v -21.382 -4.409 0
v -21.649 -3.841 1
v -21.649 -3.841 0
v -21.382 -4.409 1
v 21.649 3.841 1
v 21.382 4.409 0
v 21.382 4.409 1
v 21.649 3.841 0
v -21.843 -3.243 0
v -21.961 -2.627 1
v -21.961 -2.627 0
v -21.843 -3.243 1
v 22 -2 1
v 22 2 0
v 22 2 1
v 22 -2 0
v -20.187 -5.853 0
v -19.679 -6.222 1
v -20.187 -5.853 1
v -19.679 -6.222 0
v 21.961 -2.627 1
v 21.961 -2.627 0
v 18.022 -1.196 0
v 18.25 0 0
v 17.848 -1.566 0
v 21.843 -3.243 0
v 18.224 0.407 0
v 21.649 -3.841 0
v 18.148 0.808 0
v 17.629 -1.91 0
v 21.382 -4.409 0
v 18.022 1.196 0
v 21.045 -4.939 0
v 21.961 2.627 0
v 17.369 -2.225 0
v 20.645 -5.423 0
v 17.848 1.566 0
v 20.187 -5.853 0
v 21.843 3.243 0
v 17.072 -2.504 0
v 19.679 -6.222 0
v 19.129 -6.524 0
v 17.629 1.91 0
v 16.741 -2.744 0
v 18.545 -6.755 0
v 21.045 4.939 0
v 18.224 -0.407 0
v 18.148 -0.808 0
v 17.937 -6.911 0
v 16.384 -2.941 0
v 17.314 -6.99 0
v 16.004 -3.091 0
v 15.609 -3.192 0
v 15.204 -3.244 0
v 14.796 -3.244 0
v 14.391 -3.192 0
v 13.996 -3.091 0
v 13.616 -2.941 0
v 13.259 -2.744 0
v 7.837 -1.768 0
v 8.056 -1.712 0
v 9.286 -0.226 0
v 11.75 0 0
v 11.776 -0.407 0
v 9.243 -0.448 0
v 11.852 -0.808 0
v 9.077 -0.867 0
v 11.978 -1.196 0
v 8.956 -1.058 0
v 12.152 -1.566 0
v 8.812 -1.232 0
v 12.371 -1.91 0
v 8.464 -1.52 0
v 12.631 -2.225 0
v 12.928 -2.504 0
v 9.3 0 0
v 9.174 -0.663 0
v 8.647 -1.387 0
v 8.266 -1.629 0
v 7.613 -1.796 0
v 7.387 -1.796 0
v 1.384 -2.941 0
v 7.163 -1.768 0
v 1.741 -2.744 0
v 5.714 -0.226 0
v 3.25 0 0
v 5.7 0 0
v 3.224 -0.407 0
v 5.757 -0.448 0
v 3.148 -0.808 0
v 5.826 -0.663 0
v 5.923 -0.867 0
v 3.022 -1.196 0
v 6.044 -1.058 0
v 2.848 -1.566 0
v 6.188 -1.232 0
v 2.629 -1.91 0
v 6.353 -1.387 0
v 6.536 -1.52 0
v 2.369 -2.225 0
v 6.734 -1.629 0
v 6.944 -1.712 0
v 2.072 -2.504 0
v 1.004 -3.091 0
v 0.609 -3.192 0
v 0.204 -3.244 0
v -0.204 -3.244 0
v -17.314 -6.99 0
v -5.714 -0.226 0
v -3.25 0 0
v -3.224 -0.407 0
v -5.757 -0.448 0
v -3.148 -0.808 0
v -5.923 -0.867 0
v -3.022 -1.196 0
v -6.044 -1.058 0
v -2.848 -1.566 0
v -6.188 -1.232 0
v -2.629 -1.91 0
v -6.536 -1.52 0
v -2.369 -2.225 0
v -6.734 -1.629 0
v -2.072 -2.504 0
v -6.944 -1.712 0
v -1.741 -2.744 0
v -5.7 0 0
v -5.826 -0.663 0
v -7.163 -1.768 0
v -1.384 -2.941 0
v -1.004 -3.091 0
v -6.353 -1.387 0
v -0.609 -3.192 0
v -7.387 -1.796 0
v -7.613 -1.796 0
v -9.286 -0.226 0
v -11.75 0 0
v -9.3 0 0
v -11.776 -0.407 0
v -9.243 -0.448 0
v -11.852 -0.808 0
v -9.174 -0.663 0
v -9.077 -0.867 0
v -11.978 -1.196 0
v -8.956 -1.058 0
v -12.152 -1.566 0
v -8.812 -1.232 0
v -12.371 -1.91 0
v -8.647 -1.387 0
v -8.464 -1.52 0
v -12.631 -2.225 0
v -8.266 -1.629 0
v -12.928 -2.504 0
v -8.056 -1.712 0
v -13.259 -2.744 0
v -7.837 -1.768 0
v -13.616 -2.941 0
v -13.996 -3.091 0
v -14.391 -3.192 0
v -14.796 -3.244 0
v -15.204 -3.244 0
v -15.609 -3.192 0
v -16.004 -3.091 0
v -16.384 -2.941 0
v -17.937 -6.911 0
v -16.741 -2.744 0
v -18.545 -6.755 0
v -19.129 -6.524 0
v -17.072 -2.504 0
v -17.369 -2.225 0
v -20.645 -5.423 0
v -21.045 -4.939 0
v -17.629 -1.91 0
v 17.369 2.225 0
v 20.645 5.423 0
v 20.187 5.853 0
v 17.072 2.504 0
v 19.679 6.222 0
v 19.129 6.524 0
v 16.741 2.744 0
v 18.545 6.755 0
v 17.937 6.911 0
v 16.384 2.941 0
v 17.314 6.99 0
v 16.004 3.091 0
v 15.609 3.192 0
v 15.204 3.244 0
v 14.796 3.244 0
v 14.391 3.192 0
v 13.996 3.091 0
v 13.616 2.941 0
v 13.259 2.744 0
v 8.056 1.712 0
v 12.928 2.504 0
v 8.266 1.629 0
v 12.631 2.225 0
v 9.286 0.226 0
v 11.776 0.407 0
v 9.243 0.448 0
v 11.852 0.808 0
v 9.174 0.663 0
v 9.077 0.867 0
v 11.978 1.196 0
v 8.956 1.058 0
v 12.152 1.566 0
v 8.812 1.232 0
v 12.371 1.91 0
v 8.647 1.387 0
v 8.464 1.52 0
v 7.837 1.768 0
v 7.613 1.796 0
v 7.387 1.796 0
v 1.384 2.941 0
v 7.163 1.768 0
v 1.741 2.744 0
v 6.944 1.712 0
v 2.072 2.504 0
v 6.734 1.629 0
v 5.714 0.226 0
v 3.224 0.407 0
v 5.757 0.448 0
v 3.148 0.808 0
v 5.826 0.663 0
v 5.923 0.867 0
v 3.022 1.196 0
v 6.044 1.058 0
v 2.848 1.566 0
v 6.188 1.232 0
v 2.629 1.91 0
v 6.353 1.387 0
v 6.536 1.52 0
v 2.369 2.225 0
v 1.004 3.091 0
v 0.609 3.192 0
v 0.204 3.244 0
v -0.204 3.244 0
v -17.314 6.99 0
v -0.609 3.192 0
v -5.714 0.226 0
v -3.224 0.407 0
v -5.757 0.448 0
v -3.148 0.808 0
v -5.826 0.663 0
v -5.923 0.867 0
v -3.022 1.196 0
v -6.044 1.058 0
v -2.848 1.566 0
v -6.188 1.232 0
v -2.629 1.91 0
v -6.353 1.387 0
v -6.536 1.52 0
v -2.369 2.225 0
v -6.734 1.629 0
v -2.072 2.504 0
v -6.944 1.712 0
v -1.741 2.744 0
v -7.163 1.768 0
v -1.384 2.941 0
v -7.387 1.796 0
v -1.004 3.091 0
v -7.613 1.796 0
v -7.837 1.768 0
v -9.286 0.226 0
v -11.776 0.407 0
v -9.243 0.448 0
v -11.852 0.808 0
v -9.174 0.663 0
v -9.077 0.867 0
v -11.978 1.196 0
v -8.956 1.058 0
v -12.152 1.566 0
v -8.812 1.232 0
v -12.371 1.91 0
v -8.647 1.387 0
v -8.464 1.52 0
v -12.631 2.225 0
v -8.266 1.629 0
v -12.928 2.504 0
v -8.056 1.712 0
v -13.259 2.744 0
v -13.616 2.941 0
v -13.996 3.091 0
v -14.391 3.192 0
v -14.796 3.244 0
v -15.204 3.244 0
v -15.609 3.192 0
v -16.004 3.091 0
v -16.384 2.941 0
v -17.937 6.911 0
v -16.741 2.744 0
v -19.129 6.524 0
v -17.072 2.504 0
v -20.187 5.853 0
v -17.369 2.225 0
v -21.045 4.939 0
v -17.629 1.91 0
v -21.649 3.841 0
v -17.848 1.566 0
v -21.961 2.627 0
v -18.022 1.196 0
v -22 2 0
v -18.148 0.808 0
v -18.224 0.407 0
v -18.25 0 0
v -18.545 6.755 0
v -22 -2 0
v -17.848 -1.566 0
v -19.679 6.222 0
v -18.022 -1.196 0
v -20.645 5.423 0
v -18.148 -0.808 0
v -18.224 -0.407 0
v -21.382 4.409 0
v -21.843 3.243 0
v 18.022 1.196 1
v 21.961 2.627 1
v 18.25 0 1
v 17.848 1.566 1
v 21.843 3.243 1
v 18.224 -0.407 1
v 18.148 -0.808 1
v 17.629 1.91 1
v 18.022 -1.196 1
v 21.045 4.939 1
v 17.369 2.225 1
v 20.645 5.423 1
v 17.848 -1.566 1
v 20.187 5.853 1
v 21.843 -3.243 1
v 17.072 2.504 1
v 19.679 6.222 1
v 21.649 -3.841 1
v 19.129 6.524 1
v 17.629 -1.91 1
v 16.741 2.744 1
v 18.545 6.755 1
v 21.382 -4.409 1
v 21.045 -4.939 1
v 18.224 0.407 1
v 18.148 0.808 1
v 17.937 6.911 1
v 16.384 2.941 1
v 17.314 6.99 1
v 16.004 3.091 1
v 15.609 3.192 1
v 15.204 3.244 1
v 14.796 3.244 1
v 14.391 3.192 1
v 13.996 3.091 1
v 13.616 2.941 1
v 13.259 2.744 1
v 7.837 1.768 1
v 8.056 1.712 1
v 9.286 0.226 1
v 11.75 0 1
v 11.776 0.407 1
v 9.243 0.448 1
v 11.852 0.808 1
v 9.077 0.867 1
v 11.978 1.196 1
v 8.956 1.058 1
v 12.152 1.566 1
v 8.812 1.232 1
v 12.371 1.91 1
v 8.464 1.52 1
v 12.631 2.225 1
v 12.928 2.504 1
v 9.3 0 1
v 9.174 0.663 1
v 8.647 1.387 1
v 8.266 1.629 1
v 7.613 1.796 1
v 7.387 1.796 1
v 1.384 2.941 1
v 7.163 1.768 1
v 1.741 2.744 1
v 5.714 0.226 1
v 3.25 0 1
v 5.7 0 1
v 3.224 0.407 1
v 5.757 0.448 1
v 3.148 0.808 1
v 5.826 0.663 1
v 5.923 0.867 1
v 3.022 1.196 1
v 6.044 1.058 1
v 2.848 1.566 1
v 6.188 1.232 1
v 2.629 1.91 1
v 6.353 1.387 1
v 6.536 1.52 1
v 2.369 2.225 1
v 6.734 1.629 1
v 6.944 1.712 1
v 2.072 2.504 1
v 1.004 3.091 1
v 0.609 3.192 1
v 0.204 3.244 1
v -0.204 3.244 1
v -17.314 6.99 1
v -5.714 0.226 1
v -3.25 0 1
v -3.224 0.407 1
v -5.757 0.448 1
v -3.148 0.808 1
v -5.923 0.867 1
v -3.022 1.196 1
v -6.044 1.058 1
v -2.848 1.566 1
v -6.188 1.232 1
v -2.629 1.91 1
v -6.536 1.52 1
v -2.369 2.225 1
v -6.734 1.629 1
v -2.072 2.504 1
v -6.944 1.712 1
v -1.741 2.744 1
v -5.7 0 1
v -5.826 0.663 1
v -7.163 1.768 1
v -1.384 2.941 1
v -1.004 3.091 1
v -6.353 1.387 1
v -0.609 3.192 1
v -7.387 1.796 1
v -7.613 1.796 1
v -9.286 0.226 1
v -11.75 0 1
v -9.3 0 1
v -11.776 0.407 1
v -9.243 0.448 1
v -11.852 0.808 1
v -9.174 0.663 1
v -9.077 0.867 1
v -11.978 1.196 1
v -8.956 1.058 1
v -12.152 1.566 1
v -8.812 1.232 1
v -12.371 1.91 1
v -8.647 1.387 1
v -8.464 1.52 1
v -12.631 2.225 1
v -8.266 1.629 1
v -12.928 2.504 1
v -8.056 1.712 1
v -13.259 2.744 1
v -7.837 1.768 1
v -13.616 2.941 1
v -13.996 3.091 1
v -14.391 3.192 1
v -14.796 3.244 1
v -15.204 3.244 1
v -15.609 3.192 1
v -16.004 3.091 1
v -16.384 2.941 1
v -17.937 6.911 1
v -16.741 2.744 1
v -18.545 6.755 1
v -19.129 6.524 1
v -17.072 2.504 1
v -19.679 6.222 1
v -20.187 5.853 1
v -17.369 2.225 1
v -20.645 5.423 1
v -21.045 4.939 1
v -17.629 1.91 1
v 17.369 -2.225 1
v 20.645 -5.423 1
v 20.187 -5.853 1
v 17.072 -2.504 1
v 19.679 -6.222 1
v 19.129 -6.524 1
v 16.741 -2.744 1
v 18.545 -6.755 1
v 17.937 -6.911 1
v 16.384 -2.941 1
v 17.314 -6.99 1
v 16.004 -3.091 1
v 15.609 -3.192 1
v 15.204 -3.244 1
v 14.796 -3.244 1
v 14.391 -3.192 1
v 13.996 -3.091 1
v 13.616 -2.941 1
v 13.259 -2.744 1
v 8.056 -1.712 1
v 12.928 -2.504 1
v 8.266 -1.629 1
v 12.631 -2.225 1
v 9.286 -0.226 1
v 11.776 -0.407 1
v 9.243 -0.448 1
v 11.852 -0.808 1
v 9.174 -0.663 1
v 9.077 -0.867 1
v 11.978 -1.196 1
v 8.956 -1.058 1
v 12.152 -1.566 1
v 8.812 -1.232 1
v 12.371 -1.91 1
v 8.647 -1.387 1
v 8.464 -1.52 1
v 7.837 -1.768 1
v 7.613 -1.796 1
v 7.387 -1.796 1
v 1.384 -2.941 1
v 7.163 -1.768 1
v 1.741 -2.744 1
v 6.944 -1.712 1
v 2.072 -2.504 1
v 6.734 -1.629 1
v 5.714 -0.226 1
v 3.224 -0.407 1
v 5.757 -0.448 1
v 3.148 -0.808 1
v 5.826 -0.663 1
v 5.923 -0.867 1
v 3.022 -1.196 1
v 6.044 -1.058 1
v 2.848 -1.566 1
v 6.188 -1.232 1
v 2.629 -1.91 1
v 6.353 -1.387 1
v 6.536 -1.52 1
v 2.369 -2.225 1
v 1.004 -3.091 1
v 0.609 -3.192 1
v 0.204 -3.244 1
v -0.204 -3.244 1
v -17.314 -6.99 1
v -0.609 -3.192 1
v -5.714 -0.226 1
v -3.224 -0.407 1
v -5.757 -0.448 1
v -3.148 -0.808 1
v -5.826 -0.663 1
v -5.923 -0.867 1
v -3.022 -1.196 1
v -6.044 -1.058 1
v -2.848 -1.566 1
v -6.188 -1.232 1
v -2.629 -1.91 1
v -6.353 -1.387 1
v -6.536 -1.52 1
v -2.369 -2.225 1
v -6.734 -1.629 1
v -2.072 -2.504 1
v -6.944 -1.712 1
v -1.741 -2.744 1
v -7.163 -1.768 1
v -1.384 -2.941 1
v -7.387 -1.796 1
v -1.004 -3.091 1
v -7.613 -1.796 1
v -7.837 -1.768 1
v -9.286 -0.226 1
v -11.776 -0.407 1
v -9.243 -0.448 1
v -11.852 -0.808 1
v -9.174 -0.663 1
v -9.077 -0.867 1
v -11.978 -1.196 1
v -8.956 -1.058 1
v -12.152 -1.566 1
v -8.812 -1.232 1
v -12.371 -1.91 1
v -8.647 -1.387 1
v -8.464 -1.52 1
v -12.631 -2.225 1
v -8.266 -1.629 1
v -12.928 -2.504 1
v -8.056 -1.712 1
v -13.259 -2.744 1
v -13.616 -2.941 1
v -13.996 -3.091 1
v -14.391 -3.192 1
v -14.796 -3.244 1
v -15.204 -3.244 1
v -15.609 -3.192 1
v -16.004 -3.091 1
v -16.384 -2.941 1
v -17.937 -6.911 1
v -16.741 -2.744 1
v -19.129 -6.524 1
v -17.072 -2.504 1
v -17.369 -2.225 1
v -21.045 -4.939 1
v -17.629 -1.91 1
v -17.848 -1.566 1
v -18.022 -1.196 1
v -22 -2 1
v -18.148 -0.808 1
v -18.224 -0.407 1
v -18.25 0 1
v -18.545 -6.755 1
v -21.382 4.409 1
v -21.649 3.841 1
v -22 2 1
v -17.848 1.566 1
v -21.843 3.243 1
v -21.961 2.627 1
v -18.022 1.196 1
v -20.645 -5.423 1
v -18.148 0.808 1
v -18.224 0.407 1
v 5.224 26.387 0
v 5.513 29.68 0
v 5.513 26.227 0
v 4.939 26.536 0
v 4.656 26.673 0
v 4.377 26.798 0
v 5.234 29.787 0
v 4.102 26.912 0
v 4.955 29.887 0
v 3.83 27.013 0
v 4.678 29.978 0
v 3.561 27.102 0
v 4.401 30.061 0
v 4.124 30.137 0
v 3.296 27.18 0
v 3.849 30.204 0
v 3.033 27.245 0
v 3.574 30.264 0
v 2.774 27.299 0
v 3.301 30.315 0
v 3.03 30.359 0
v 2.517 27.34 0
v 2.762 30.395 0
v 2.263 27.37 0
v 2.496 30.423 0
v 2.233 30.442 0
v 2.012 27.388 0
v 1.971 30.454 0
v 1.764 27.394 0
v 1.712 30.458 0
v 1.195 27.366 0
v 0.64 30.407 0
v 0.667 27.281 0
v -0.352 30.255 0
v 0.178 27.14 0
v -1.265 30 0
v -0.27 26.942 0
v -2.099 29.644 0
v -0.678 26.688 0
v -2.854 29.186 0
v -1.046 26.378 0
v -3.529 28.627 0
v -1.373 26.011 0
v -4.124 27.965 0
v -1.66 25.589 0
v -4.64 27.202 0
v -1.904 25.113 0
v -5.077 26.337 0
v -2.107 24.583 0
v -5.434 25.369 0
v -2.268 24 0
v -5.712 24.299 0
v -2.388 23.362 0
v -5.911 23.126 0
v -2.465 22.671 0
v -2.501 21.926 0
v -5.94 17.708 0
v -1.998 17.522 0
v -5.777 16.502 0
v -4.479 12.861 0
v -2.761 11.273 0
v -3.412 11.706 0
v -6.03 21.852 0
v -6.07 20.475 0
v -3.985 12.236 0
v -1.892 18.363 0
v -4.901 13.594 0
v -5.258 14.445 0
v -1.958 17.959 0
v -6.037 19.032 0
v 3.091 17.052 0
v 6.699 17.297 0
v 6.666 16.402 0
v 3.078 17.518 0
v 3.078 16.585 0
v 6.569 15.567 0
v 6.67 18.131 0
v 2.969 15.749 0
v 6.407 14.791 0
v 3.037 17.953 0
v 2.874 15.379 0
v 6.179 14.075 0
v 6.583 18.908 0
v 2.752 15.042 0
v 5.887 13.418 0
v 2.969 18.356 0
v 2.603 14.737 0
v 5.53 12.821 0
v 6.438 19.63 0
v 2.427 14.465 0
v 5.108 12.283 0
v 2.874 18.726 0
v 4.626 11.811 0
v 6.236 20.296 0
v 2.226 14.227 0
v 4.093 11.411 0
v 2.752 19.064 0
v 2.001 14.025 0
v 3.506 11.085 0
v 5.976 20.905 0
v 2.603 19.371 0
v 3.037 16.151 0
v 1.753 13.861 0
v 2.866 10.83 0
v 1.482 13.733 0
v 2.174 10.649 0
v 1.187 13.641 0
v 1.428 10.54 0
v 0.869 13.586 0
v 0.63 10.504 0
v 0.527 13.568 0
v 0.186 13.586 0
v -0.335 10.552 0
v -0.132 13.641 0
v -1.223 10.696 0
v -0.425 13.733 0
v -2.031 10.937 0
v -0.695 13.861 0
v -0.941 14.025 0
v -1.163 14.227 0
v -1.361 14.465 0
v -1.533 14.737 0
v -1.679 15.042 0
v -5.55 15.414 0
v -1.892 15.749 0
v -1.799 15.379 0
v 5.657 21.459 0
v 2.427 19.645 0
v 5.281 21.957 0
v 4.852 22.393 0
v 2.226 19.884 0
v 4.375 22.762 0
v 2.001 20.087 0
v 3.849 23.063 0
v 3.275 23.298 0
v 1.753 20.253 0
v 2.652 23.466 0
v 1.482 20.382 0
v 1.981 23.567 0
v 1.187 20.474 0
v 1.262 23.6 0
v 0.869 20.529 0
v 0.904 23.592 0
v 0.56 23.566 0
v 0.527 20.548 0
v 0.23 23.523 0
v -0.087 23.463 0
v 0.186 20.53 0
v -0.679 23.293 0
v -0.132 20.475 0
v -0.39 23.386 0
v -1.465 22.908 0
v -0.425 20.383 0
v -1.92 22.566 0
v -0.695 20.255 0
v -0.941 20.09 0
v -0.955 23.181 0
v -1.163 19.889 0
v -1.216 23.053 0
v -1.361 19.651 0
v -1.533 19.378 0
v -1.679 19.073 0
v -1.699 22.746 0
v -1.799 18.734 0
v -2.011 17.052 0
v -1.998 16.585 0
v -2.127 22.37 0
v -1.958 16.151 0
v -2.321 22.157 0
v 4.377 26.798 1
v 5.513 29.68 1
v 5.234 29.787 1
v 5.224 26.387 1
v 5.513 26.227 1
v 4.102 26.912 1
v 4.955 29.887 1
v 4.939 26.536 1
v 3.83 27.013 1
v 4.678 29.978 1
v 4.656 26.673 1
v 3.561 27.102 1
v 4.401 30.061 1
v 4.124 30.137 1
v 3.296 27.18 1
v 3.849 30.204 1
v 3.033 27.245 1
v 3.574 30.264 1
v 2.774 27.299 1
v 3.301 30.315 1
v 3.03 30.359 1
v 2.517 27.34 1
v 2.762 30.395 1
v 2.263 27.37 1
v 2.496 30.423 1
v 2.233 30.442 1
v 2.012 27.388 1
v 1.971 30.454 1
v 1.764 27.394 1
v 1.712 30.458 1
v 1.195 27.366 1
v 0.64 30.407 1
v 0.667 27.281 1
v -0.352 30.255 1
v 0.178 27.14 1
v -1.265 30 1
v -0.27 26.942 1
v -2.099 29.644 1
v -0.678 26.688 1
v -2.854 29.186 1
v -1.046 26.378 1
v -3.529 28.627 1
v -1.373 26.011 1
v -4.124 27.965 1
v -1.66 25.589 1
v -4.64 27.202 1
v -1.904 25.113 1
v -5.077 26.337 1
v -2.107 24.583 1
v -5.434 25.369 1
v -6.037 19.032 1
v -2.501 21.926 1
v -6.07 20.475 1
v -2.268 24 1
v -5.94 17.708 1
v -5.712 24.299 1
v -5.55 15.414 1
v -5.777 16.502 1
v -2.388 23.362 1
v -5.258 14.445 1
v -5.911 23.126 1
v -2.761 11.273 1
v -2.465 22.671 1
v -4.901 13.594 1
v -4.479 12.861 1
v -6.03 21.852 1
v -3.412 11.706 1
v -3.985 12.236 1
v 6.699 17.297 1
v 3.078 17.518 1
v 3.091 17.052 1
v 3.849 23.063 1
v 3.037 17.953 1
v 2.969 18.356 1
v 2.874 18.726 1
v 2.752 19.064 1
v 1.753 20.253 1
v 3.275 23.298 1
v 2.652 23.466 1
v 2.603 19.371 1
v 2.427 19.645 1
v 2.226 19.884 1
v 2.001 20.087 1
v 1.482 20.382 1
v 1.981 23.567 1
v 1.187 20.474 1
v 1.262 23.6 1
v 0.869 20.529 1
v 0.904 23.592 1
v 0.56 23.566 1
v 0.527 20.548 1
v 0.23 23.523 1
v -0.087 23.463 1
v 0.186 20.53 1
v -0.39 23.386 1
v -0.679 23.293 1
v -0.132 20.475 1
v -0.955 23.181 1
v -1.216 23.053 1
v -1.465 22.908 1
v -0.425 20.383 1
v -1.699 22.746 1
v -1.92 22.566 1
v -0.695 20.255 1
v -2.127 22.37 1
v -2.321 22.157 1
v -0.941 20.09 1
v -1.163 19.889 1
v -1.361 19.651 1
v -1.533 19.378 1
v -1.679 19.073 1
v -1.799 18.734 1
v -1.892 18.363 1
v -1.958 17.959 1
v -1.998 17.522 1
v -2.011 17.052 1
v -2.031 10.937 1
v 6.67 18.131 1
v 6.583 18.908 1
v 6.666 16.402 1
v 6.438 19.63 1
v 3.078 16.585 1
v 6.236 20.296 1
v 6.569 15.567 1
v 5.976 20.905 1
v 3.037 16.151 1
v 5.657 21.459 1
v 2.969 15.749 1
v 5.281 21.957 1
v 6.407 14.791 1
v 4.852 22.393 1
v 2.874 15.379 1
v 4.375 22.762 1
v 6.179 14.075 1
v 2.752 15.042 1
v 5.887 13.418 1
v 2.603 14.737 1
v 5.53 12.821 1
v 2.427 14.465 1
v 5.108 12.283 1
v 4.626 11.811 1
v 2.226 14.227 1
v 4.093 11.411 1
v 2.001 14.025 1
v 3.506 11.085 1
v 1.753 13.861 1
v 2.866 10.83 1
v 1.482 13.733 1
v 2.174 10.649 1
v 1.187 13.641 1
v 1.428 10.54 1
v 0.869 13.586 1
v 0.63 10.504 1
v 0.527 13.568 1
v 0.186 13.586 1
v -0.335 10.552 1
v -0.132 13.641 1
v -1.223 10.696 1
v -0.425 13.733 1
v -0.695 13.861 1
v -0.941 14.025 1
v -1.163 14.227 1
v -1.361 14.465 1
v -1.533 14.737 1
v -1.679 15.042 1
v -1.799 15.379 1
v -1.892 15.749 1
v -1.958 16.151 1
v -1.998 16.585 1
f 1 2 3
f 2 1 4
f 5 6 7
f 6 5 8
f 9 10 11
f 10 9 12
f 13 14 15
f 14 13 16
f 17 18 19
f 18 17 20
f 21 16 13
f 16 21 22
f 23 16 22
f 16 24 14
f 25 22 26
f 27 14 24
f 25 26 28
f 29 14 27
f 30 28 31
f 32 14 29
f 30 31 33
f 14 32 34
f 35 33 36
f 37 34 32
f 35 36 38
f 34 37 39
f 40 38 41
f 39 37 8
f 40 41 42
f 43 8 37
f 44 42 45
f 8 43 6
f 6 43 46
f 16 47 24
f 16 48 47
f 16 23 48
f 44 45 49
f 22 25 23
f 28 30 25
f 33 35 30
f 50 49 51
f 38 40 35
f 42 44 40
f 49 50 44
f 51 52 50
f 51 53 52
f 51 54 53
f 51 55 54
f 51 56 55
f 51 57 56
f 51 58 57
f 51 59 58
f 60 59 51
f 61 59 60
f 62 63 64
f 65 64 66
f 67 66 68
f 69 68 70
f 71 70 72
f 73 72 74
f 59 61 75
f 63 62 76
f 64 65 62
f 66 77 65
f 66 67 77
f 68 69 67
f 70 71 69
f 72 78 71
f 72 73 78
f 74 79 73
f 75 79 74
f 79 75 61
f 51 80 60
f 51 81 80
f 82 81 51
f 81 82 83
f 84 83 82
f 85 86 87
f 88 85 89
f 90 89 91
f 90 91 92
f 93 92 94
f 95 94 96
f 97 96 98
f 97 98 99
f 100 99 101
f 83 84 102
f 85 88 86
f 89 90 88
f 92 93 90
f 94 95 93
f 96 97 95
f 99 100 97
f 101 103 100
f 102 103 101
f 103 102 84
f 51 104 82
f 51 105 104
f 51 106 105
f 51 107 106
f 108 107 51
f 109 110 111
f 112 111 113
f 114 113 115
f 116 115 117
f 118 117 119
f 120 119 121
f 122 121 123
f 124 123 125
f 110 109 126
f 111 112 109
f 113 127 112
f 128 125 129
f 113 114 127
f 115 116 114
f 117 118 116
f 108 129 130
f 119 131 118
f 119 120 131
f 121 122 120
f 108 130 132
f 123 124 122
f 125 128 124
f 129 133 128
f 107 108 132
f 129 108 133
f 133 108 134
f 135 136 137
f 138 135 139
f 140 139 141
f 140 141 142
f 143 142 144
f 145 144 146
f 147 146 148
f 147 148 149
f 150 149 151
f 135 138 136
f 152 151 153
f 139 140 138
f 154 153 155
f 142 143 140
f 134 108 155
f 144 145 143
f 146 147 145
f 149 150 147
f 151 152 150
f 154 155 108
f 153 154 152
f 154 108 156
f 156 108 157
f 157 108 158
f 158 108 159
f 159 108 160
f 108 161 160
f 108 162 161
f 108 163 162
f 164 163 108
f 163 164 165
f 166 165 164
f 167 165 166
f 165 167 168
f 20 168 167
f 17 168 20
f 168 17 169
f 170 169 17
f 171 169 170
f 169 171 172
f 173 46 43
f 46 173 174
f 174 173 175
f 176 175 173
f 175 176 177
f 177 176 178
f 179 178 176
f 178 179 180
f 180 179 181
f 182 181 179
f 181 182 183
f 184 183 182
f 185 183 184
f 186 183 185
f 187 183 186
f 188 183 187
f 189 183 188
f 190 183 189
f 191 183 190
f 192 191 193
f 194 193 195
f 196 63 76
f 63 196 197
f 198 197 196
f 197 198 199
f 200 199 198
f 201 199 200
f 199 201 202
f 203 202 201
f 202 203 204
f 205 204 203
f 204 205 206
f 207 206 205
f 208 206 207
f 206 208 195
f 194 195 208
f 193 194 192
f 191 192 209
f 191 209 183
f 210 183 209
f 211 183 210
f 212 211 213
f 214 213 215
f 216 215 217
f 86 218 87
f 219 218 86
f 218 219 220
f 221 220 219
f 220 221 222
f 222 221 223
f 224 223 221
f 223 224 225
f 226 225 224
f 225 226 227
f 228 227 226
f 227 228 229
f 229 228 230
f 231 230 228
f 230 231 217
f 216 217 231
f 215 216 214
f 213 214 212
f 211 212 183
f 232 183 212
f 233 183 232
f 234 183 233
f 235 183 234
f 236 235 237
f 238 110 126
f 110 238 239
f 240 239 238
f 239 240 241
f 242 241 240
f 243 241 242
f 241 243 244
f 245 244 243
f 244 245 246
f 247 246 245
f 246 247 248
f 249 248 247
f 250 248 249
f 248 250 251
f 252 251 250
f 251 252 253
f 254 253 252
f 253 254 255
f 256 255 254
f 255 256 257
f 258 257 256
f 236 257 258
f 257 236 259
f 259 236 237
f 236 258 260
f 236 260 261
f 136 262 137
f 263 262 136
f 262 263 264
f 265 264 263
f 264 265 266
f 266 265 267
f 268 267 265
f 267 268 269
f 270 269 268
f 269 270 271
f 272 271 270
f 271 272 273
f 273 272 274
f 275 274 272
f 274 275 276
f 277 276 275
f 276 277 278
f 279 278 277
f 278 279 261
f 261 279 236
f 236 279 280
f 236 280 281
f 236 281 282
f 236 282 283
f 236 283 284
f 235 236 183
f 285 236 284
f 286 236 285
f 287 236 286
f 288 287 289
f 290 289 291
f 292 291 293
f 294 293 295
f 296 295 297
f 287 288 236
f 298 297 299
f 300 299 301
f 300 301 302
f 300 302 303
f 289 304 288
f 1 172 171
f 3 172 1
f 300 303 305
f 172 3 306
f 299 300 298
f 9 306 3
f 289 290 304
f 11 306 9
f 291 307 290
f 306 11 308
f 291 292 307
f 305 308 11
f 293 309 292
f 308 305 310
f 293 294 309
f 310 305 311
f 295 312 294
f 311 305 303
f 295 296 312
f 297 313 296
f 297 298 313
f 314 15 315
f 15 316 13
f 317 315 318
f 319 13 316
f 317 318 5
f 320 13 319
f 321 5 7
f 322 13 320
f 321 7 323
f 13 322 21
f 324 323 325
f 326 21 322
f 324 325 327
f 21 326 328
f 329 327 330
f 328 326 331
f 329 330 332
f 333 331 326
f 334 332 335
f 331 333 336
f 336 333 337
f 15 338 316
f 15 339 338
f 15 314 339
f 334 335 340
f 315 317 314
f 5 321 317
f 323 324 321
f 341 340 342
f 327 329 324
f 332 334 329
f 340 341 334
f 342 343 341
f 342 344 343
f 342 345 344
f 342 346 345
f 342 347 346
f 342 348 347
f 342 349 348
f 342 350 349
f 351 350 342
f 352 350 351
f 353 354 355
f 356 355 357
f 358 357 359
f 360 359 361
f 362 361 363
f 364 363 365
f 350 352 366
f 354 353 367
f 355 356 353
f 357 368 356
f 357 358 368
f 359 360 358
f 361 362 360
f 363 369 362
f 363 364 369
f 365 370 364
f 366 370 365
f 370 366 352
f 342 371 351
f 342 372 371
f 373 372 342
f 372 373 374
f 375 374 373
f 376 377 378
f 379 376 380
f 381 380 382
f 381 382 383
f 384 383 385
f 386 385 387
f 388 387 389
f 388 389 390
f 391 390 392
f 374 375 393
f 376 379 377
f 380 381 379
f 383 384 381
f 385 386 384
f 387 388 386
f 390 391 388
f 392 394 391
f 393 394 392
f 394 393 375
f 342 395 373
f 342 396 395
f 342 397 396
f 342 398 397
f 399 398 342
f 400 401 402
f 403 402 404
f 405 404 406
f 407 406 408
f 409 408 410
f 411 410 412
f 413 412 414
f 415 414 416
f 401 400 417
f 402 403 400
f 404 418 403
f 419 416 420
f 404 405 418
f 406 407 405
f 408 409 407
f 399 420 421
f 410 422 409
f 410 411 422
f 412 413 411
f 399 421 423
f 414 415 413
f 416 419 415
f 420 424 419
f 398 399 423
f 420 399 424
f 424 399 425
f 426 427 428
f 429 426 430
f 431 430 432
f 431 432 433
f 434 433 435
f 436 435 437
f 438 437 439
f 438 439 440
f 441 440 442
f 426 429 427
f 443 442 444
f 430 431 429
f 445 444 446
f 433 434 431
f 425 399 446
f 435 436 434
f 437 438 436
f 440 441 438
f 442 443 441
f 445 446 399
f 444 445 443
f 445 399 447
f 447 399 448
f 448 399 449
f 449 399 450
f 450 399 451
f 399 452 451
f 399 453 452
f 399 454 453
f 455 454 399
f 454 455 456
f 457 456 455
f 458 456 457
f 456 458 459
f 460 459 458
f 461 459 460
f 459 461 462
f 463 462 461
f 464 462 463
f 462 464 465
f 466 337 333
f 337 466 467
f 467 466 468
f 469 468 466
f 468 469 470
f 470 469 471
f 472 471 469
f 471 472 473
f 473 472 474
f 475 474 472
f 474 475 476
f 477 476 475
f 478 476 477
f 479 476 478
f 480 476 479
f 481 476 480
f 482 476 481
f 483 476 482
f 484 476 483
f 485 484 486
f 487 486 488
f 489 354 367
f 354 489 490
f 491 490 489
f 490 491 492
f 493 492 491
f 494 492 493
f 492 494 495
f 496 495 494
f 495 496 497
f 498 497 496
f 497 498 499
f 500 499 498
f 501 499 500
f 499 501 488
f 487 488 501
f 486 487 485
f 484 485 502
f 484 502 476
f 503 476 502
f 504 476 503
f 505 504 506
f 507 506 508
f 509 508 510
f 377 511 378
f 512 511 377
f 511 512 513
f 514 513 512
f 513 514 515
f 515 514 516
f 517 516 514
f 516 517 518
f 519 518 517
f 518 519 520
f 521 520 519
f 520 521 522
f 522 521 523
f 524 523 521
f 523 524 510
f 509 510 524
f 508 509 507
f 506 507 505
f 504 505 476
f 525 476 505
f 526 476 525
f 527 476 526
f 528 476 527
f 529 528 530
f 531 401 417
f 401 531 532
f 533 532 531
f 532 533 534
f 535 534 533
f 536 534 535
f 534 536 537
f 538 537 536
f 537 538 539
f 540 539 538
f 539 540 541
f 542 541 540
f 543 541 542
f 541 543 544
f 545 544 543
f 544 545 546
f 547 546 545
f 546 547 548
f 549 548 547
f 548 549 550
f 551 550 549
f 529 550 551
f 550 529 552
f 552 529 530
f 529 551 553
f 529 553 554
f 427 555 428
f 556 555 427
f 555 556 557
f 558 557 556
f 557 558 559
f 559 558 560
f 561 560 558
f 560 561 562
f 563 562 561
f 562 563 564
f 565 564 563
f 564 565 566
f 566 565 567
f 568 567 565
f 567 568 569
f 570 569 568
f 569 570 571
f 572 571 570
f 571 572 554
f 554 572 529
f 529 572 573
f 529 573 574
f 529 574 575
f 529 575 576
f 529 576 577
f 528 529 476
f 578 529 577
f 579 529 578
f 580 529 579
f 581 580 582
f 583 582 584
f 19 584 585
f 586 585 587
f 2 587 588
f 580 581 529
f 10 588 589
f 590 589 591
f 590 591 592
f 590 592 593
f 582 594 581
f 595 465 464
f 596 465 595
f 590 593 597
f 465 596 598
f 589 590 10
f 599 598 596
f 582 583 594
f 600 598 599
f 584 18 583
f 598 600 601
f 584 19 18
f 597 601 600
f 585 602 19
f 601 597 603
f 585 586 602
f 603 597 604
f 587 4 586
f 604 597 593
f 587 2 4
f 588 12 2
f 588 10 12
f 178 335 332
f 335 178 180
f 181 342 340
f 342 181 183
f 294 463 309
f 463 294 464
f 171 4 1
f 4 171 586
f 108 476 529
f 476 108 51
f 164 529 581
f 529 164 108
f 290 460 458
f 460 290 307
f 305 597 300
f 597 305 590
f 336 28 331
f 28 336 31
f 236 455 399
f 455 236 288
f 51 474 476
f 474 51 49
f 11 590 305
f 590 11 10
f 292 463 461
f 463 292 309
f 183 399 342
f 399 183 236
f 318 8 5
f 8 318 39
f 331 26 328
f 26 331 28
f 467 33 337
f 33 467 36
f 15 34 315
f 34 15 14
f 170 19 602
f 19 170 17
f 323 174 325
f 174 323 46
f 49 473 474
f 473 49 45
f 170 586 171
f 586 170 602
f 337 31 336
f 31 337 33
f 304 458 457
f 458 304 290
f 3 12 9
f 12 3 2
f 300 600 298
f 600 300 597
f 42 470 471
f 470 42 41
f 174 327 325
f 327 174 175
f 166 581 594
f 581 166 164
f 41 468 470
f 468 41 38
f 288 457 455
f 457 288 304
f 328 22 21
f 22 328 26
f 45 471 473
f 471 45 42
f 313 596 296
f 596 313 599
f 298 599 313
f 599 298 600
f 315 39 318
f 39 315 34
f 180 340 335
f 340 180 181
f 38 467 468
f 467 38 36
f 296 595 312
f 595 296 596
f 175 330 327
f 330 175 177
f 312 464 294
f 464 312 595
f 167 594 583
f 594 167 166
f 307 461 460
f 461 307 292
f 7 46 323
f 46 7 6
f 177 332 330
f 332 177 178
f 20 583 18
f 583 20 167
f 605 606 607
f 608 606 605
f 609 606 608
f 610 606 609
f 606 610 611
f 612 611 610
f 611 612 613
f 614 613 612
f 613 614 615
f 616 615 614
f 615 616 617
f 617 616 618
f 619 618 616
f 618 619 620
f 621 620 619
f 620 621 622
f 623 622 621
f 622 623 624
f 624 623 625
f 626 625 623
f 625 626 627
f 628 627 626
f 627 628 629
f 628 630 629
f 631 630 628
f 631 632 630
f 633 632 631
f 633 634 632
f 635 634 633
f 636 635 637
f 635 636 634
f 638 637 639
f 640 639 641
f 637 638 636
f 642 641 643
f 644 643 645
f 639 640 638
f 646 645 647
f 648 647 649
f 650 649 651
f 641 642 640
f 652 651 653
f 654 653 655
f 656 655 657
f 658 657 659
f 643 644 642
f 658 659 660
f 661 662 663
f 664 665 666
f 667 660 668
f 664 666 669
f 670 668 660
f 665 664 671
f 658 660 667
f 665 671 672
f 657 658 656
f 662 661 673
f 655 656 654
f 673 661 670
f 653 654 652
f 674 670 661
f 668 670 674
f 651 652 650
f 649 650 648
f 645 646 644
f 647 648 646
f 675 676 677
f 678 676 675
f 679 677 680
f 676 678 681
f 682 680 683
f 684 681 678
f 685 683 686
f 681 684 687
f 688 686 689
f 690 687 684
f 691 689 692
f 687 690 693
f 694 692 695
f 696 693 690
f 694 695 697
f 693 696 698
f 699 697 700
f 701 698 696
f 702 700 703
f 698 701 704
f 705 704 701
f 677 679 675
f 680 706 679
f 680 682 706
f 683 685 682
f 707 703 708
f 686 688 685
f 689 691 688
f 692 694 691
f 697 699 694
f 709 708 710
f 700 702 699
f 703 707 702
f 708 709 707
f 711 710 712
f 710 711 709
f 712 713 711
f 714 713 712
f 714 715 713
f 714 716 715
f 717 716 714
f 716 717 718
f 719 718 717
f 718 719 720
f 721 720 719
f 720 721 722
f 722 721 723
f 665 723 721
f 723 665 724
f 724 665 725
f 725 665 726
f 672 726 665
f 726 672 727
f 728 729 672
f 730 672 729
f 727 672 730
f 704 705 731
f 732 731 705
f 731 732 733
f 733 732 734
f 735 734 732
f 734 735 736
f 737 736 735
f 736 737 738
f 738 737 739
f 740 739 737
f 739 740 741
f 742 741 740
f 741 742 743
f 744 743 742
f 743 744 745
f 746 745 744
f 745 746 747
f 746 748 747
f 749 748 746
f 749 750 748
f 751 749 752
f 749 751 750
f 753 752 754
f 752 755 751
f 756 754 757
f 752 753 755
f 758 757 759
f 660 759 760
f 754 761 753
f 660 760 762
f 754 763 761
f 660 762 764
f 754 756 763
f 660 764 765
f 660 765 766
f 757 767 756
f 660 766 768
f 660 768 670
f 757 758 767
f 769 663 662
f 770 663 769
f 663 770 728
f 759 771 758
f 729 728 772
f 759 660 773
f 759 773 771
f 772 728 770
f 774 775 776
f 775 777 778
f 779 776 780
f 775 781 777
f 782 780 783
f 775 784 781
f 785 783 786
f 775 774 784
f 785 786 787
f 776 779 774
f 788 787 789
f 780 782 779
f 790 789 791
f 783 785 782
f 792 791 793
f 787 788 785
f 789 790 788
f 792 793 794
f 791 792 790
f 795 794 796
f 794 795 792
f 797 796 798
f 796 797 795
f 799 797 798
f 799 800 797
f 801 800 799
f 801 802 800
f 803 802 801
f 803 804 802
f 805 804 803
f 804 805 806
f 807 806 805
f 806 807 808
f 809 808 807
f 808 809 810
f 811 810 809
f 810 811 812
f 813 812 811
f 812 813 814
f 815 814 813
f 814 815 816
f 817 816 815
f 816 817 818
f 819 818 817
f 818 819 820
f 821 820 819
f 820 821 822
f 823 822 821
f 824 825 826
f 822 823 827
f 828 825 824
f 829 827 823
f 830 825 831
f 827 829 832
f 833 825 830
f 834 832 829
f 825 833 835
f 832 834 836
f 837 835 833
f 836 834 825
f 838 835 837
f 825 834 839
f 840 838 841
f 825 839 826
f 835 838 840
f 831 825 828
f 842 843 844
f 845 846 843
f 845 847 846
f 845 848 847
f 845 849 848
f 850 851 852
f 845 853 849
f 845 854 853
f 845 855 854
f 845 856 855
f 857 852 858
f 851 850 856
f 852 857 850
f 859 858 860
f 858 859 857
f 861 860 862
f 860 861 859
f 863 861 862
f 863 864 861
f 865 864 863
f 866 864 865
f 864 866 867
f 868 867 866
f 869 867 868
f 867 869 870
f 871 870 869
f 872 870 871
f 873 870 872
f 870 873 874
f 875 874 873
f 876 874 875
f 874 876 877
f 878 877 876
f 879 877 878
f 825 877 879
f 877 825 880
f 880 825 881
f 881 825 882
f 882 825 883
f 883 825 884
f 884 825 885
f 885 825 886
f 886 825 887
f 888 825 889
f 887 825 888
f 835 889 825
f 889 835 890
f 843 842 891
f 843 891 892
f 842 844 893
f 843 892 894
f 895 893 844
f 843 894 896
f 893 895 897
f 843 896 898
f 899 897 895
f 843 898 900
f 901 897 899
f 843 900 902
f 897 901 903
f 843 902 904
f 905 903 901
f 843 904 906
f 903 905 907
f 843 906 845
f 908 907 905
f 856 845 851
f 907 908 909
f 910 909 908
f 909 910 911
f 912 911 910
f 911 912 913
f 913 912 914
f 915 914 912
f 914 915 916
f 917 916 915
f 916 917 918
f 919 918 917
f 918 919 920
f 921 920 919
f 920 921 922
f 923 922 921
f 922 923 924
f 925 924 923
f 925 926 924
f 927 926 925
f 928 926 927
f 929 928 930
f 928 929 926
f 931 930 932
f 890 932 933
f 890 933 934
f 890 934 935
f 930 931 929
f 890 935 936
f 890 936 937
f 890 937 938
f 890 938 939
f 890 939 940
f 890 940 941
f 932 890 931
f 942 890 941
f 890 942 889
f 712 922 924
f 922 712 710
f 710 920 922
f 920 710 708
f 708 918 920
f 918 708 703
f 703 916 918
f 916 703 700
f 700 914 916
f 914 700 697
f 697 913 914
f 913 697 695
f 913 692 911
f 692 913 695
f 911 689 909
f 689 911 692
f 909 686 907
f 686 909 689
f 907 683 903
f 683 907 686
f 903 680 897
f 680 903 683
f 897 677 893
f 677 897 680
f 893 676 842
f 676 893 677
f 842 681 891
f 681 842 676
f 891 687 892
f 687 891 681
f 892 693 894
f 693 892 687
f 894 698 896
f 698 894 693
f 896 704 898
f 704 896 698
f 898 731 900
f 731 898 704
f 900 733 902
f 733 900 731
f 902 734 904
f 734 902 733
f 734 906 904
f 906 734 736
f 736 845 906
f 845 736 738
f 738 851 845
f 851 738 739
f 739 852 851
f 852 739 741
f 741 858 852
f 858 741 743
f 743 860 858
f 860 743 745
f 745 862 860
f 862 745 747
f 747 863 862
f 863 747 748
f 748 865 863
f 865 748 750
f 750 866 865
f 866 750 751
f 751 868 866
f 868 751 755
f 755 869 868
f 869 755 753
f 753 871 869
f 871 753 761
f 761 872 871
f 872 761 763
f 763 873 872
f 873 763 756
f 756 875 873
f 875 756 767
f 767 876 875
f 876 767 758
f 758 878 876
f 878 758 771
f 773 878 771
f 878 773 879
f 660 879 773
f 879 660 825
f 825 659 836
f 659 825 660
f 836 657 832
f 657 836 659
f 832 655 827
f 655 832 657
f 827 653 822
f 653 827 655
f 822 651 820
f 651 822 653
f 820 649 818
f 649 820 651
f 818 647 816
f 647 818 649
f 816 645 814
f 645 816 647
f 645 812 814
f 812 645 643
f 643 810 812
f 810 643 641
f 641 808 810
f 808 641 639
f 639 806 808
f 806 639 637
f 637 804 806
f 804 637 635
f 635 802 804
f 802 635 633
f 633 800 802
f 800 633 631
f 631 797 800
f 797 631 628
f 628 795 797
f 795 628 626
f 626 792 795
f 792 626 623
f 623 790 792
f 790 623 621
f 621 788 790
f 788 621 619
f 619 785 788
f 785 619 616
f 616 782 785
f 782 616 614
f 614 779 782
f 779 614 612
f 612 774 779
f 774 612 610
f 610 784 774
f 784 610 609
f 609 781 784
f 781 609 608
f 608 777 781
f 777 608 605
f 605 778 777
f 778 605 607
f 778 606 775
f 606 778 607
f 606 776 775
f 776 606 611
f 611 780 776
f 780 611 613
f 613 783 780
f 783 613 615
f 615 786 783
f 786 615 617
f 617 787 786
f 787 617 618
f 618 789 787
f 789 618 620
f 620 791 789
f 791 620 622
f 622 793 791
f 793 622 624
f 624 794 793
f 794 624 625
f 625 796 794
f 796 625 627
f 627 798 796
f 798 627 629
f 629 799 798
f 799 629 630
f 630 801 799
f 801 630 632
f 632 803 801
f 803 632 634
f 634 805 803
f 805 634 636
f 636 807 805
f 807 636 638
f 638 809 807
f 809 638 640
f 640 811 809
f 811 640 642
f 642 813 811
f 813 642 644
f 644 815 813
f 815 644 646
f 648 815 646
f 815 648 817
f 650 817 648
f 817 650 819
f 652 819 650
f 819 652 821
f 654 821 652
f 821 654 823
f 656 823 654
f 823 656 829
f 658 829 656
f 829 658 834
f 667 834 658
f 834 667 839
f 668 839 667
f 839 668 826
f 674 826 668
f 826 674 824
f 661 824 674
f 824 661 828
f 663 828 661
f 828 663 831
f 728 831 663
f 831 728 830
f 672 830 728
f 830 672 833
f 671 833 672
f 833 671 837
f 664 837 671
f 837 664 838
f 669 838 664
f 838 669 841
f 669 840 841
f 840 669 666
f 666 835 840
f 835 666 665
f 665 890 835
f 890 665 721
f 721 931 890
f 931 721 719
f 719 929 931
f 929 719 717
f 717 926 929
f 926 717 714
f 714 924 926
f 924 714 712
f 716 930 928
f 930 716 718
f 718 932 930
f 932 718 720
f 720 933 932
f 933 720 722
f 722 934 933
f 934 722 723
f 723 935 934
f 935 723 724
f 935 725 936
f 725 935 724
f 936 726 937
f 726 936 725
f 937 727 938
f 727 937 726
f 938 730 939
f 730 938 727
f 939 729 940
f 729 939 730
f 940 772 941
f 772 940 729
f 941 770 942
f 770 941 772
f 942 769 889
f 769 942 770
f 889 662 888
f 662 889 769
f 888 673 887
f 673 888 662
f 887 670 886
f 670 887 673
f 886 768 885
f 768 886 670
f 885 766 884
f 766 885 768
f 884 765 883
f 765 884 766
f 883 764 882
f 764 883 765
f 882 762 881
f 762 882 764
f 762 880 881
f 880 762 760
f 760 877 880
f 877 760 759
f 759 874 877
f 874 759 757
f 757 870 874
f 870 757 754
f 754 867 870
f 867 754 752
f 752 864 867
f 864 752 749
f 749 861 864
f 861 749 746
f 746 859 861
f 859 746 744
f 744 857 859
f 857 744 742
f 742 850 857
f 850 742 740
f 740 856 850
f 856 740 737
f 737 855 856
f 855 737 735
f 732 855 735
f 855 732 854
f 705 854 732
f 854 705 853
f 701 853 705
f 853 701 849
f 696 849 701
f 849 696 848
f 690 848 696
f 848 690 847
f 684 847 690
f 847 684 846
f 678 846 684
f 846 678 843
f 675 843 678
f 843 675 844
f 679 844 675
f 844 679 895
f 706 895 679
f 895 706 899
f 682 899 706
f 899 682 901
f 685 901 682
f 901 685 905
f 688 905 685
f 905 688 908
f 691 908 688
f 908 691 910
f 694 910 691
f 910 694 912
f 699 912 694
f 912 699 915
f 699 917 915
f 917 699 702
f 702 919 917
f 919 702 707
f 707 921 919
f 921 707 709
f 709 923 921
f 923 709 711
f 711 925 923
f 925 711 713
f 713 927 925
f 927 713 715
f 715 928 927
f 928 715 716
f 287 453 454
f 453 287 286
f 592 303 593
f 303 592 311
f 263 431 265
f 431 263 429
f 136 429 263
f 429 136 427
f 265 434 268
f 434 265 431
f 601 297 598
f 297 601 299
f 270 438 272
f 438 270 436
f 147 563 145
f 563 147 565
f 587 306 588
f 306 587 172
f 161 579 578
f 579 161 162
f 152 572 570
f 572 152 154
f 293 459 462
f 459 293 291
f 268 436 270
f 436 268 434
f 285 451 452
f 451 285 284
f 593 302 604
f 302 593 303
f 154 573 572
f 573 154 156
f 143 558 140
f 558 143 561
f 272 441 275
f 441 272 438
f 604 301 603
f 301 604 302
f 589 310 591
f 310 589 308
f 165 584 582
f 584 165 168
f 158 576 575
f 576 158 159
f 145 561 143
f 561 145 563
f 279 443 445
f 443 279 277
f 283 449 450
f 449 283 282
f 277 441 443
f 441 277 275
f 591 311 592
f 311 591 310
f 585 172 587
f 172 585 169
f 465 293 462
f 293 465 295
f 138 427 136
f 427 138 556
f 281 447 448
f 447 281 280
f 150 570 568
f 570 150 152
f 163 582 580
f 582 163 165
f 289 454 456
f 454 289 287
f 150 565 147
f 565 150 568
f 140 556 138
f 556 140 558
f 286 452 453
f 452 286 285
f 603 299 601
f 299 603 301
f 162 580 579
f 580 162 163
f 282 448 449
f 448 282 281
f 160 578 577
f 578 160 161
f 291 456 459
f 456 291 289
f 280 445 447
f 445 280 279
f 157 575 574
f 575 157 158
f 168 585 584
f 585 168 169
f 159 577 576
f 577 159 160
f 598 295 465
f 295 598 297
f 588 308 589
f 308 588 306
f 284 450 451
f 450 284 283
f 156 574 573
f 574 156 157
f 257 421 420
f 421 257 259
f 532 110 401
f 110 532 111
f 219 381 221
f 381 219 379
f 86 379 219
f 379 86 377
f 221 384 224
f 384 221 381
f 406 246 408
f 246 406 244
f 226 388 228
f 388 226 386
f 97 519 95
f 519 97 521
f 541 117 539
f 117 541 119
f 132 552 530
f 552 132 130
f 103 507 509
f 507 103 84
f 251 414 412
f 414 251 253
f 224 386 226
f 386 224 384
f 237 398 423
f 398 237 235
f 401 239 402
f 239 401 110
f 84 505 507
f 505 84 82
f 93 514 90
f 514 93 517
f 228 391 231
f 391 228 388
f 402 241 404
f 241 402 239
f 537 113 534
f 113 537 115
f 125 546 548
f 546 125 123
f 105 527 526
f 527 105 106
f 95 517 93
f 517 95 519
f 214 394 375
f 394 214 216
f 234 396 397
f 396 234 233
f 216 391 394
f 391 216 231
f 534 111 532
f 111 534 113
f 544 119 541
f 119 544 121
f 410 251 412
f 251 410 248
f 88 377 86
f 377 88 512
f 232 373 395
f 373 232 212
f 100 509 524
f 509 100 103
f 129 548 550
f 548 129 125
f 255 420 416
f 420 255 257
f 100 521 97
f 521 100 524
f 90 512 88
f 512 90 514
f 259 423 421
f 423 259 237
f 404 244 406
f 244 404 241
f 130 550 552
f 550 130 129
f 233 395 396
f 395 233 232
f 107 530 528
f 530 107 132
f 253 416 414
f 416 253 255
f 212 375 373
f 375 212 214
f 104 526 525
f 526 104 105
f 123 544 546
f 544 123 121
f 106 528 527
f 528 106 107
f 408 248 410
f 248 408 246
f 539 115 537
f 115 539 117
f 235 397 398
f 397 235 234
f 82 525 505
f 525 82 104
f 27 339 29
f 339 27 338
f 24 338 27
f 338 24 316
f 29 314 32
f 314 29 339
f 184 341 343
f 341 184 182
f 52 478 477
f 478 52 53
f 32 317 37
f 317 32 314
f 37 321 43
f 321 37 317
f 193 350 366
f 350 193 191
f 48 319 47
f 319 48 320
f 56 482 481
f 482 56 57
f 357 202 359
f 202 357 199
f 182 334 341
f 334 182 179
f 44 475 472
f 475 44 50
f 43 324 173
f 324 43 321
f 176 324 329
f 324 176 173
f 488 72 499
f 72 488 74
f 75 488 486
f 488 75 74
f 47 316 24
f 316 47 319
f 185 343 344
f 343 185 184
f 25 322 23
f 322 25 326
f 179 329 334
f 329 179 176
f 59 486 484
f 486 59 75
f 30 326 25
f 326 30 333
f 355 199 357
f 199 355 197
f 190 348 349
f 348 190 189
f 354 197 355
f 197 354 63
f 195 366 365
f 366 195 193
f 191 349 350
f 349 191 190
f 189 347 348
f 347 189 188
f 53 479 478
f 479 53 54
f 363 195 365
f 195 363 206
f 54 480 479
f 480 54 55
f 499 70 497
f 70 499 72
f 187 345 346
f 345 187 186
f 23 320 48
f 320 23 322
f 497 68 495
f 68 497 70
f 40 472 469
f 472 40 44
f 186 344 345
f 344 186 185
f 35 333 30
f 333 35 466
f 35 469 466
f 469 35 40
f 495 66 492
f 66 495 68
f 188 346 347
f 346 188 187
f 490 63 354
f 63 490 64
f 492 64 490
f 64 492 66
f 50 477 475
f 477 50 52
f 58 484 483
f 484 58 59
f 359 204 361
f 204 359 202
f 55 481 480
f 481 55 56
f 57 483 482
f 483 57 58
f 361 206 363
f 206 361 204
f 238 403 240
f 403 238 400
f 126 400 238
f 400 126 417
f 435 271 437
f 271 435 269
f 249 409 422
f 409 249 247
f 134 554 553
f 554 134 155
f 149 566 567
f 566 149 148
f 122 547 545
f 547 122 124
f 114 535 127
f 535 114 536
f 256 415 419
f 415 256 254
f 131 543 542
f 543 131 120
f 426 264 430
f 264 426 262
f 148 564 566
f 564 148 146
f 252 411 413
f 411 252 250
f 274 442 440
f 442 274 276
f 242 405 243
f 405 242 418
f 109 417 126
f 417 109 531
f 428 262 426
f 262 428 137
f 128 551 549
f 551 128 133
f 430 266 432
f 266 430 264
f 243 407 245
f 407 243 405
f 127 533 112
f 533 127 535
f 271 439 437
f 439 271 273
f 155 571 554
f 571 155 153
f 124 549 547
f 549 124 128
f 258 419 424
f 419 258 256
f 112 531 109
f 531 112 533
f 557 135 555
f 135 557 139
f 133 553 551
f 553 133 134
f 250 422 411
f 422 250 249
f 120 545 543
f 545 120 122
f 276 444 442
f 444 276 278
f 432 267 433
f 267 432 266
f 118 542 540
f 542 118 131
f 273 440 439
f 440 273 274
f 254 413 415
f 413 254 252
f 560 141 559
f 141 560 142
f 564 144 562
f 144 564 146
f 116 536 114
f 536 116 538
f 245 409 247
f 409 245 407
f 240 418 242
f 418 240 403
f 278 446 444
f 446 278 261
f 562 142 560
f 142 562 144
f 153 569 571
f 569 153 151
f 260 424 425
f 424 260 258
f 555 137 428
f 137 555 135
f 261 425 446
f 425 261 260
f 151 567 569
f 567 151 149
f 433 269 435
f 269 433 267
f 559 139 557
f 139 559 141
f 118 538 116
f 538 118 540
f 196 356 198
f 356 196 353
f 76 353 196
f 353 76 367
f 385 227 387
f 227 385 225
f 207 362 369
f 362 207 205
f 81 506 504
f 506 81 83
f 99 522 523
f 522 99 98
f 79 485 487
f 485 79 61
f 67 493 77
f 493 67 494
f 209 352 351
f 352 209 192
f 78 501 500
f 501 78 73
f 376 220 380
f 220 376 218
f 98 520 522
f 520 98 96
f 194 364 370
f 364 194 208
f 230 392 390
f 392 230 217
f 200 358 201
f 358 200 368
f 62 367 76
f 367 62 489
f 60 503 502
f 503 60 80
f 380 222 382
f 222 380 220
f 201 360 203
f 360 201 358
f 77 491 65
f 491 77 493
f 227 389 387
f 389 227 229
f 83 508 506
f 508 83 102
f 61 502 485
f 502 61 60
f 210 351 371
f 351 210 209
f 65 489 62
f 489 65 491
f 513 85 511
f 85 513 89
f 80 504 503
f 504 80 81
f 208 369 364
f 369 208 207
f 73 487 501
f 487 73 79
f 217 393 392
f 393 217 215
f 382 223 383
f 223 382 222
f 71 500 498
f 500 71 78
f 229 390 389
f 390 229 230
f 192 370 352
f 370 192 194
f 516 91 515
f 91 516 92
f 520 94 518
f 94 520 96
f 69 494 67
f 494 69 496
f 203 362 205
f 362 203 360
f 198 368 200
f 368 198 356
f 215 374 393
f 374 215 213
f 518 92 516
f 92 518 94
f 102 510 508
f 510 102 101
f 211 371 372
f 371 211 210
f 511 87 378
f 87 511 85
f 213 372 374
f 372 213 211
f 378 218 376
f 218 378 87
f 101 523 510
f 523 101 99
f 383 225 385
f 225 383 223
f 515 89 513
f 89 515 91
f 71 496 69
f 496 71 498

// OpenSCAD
$fn = 50;


difference() {
	union() {
		hull() {
			translate(v = [-17.0000000000, 2.0000000000, 0]) {
				cylinder(h = 1, r = 5);
			}
			translate(v = [17.0000000000, 2.0000000000, 0]) {
				cylinder(h = 1, r = 5);
			}
			translate(v = [-17.0000000000, -2.0000000000, 0]) {
				cylinder(h = 1, r = 5);
			}
			translate(v = [17.0000000000, -2.0000000000, 0]) {
				cylinder(h = 1, r = 5);
			}
		}
		translate(v = [0, 30.0000000000, 0]) {
			linear_extrude(height = 1) {
				text(font = "DejaVu Sans Mono:style=Bold", halign = "center", size = 19.0000000000, text = "6", valign = "top");
			}
		}
	}
	union() {
		translate(v = [-15.0000000000, 0.0000000000, 0]) {
			translate(v = [0, 0, -100]) {
				cylinder(h = 200, r = 3.2500000000);
			}
		}
		translate(v = [0, 0, -100]) {
			cylinder(h = 200, r = 3.2500000000);
		}
		translate(v = [15.0000000000, 0.0000000000, 0]) {
			translate(v = [0, 0, -100]) {
				cylinder(h = 200, r = 3.2500000000);
			}
		}
		translate(v = [-15.0000000000, 0.0000000000, 0]) {
			translate(v = [0, 0, -100]) {
				cylinder(h = 200, r = 1.8000000000);
			}
		}
		translate(v = [-7.5000000000, 0.0000000000, 0]) {
			translate(v = [0, 0, -100]) {
				cylinder(h = 200, r = 1.8000000000);
			}
		}
		translate(v = [0, 0, -100]) {
			cylinder(h = 200, r = 1.8000000000);
		}
		translate(v = [7.5000000000, 0.0000000000, 0]) {
			translate(v = [0, 0, -100]) {
				cylinder(h = 200, r = 1.8000000000);
			}
		}
		translate(v = [15.0000000000, 0.0000000000, 0]) {
			translate(v = [0, 0, -100]) {
				cylinder(h = 200, r = 1.8000000000);
			}
		}
	}
}
